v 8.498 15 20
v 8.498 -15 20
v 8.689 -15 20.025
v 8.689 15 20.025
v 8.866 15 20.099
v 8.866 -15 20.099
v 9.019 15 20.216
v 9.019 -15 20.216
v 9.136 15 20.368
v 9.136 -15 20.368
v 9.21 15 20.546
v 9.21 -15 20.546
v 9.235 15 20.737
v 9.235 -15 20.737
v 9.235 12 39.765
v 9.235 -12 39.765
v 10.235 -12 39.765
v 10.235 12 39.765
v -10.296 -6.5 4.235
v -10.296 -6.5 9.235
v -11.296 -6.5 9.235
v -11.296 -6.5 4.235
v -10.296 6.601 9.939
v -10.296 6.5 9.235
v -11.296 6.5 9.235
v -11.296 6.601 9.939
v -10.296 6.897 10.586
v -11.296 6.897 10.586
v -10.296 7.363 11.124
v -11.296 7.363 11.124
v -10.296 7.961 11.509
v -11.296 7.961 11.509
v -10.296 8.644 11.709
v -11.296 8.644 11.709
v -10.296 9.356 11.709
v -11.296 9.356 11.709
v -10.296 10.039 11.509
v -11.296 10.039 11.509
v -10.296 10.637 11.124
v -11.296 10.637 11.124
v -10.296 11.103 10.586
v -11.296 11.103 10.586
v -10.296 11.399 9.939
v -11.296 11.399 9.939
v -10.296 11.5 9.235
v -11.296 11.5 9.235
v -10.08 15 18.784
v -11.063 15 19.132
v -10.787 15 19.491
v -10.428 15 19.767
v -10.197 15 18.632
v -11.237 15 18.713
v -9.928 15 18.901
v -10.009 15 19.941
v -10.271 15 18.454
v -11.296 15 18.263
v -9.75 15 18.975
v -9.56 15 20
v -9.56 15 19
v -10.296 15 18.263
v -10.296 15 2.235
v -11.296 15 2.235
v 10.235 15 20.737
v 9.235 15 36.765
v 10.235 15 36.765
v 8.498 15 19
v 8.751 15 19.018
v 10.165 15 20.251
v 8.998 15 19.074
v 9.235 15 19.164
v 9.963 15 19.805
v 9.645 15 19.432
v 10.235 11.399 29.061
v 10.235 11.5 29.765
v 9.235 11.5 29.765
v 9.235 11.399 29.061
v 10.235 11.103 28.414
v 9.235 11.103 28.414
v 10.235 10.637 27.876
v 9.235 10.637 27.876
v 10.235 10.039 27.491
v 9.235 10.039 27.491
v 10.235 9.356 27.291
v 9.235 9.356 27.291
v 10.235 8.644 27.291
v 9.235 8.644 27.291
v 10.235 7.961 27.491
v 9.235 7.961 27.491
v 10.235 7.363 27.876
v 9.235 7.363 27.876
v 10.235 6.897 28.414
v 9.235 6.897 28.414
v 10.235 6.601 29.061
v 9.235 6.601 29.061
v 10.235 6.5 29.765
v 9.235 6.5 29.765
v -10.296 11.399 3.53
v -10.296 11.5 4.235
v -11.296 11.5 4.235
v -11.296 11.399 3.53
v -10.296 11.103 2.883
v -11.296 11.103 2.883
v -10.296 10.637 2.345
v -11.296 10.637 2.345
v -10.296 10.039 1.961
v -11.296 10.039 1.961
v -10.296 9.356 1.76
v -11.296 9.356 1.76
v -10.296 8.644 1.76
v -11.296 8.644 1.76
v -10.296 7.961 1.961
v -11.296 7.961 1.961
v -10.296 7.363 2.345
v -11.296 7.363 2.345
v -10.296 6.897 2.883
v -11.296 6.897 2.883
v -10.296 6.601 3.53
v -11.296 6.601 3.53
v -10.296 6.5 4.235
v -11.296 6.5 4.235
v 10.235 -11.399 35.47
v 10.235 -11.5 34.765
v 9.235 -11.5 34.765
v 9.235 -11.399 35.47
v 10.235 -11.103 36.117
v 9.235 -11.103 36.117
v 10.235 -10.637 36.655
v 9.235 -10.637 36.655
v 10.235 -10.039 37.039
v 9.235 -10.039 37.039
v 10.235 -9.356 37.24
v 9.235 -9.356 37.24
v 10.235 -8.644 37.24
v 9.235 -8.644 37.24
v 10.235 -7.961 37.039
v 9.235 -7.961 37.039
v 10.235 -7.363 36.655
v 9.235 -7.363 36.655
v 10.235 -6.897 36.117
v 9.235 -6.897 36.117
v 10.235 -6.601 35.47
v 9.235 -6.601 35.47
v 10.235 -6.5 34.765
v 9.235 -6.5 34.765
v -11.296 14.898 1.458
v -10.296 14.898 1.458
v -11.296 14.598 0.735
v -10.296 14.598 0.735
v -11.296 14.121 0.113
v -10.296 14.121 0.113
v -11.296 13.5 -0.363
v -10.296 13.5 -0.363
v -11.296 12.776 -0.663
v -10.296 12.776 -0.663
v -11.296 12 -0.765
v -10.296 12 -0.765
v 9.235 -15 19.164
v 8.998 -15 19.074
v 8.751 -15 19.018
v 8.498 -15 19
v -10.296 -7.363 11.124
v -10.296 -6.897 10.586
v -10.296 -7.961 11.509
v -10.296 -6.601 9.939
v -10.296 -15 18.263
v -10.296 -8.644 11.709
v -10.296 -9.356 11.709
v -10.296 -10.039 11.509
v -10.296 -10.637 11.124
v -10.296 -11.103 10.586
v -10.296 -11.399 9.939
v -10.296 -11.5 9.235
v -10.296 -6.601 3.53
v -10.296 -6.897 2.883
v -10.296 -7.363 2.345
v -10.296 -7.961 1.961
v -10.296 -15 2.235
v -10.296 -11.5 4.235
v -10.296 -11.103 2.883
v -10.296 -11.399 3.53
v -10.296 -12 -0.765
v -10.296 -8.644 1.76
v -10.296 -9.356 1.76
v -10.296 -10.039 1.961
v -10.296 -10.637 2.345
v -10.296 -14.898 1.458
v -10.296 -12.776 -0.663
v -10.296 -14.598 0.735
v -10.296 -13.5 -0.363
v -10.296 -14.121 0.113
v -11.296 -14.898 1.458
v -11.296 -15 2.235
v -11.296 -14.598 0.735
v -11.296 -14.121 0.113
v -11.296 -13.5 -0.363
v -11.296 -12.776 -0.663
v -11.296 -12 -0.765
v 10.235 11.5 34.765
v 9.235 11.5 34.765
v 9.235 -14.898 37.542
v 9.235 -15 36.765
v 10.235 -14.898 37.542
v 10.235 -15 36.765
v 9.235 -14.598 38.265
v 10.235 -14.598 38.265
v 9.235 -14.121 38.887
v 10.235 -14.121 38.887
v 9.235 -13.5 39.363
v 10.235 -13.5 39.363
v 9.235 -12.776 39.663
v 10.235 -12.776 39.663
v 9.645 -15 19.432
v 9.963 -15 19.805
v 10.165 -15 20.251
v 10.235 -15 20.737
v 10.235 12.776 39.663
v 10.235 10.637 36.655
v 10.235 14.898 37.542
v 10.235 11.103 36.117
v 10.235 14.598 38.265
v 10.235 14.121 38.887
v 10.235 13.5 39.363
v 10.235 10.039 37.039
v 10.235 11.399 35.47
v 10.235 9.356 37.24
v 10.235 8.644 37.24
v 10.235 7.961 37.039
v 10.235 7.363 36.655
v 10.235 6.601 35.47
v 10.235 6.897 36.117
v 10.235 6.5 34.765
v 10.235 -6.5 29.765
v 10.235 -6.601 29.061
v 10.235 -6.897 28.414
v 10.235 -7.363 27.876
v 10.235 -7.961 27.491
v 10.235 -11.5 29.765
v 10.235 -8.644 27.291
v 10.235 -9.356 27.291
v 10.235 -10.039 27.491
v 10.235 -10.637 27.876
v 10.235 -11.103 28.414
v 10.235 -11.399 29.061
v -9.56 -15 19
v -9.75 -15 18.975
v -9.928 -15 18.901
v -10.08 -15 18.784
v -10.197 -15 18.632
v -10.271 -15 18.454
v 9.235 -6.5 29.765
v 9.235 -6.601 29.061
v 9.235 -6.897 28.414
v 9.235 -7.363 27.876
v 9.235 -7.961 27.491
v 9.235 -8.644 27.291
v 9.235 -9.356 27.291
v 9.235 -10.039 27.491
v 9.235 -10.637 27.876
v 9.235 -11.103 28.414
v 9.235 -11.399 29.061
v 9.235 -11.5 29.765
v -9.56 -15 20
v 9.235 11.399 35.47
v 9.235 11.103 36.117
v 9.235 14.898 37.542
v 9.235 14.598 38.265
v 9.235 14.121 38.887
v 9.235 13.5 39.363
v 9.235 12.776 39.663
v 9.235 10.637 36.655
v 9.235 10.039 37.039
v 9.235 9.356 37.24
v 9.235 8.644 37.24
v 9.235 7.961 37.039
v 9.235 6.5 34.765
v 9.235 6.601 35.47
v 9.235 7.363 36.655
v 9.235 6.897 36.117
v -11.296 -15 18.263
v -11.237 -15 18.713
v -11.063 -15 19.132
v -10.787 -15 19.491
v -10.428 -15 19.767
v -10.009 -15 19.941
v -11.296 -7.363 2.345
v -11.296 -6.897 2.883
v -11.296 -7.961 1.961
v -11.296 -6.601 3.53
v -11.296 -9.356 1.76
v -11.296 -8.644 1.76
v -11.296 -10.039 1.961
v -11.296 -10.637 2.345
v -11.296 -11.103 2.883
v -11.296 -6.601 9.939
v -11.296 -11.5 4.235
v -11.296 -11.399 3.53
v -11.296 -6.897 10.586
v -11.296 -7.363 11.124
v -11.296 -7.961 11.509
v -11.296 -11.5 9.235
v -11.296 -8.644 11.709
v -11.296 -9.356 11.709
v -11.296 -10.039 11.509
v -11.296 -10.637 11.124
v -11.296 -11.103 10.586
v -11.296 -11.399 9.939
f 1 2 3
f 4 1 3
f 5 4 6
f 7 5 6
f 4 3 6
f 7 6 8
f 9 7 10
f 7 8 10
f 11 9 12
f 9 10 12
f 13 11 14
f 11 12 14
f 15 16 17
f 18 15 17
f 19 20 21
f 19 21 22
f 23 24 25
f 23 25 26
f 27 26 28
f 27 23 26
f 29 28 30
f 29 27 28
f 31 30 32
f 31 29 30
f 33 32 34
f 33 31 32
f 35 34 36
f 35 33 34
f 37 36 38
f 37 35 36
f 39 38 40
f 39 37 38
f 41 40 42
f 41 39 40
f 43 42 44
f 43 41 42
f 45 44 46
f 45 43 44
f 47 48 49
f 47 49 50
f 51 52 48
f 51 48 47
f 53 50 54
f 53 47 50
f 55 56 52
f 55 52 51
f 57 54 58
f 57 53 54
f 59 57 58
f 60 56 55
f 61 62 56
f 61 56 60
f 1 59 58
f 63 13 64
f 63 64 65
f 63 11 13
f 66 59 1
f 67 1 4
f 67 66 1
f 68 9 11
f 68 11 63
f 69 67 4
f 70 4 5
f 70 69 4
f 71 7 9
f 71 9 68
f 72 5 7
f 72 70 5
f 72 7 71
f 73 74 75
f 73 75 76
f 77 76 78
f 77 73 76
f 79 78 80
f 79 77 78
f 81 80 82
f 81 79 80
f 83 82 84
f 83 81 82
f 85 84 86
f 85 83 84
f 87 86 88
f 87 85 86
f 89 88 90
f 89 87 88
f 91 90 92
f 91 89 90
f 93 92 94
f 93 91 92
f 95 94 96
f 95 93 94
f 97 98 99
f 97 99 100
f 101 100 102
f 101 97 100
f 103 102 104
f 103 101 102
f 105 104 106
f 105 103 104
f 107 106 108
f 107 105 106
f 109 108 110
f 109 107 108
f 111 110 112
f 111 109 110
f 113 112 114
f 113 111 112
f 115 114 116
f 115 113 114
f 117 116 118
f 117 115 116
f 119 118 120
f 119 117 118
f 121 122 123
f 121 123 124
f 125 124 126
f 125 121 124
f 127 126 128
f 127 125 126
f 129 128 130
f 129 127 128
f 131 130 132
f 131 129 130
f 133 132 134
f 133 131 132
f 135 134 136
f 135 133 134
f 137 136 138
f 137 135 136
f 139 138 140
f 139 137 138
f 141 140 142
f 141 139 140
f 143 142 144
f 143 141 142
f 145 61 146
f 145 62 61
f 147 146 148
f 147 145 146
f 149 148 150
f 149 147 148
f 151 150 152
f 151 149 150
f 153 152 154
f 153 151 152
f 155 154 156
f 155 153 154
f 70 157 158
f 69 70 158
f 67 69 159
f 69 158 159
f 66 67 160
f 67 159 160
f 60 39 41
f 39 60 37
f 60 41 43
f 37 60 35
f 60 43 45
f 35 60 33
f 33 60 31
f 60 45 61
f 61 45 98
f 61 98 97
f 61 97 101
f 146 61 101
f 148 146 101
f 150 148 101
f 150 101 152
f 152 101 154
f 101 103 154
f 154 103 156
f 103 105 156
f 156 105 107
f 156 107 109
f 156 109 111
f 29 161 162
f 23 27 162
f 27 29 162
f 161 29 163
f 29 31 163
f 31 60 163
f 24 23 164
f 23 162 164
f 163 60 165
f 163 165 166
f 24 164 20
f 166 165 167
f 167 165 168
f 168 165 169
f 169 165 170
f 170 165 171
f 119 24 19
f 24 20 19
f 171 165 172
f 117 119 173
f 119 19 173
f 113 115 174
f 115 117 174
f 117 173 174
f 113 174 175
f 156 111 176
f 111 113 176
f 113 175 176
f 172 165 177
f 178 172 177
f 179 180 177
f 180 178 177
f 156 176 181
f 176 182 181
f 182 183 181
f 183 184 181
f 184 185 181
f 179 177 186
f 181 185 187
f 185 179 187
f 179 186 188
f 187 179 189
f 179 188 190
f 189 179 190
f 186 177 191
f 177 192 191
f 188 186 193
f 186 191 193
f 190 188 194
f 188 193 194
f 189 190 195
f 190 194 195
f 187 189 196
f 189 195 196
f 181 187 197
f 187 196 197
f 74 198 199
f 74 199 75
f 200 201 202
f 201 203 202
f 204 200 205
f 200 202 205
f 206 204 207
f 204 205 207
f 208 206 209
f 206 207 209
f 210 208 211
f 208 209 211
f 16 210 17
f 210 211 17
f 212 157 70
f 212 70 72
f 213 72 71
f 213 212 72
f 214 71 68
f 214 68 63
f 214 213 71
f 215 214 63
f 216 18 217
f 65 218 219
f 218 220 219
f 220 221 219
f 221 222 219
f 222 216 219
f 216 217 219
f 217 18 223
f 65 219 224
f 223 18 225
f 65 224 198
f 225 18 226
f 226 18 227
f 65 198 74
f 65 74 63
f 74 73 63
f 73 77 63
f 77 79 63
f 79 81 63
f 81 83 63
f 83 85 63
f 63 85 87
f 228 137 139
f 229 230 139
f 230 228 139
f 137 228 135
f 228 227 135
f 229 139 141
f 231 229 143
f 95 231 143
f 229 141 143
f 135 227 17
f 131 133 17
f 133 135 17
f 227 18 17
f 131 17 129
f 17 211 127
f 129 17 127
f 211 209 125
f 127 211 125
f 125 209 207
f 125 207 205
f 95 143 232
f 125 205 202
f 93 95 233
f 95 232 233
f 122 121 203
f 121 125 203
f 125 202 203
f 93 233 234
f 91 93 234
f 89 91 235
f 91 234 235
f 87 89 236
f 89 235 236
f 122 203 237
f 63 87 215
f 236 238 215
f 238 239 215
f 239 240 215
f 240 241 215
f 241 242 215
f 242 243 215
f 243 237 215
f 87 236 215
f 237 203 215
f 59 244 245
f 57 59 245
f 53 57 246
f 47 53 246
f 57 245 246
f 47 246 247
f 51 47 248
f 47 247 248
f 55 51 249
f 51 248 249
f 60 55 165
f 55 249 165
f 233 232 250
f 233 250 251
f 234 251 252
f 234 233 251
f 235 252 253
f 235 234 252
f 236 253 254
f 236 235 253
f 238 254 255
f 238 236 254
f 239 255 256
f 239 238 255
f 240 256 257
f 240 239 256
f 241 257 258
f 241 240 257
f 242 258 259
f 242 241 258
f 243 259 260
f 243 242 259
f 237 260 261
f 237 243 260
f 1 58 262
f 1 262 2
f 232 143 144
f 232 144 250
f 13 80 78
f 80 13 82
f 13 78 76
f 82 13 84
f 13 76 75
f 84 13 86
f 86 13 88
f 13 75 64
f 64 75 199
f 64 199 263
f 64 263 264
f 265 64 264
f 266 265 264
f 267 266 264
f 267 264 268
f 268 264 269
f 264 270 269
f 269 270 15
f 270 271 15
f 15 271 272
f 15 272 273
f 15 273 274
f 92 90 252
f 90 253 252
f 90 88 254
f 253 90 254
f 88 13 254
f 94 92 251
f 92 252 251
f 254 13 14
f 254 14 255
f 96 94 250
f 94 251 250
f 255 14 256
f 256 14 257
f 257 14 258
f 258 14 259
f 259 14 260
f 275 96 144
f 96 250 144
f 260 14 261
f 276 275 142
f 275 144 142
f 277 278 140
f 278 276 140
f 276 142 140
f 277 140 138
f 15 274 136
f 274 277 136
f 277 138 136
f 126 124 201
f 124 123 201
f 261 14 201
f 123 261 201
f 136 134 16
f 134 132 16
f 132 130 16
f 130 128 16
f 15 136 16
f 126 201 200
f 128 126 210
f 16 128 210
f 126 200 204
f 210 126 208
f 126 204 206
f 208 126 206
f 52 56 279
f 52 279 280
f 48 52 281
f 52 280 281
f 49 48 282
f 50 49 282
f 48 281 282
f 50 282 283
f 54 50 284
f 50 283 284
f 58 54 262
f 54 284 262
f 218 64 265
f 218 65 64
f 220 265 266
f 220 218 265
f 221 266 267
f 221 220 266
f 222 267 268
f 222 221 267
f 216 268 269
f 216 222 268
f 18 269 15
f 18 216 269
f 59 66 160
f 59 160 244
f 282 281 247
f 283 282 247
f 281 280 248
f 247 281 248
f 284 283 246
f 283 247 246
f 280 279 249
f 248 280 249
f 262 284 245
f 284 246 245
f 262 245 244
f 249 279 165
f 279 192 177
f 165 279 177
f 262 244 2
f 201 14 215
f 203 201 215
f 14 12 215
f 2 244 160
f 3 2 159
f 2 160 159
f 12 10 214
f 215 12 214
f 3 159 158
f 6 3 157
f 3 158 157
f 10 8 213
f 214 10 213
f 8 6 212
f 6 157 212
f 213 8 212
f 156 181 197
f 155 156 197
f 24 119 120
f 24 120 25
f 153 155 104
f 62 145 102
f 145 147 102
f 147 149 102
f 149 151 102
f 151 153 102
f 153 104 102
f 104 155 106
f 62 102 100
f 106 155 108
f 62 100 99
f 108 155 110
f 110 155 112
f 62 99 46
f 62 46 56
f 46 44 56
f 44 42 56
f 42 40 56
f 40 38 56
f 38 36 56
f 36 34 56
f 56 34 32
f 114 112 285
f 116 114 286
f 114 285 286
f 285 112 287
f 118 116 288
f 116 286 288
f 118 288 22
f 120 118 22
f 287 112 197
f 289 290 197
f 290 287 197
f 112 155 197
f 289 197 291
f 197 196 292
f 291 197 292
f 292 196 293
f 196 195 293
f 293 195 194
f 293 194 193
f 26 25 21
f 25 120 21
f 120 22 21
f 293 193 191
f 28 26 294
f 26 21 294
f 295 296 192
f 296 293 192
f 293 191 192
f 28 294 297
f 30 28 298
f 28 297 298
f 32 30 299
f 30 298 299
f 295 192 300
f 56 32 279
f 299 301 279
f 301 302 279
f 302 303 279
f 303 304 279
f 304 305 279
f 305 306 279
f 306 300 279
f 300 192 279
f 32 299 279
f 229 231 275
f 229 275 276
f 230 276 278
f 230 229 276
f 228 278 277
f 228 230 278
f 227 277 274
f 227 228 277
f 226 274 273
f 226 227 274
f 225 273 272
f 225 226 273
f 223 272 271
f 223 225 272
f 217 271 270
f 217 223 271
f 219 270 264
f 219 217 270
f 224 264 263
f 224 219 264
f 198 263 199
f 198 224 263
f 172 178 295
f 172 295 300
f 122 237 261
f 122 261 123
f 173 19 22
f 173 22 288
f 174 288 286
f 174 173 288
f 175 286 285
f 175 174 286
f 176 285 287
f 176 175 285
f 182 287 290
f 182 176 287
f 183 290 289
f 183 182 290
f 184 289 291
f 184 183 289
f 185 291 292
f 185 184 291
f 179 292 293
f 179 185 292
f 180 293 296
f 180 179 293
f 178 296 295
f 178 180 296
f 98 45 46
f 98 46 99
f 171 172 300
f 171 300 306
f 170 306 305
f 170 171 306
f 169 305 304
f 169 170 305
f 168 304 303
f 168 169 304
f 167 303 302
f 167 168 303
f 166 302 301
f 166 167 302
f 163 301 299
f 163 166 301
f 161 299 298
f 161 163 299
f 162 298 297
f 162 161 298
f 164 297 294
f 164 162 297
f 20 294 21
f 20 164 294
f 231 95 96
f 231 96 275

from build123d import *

# Parameters (mm, degrees)
SKETCH1_W              = 60
SKETCH1_H              = 30
BASE_FLANGE1_DEPTH     = 1
SKETCHED_START         = -15
SKETCHED_BEND1_DEPTH   = 30
SKETCHED_BEND1_2_DEPTH = 30
SKETCHED_BEND2_DEPTH   = 30
SKETCHED_BEND2_2_DEPTH = 30
CUT_EXTRUDE1_DEPTH     = 10
CUT_EXTRUDE2_DEPTH     = 10
FILLET1_R              = 3


# Read off the part's stored shape, not the designer's step: Sketched Bend1, Sketched Bend2
# Sheet-metal steps are written as plain solids
with BuildPart() as part:
    # Sketch1 → Base-Flange1 (new body)
    with BuildSketch(Plane.XY):
        Rectangle(SKETCH1_W, SKETCH1_H)
    extrude(amount=-BASE_FLANGE1_DEPTH)

    # Sketched Bend1 outline → Sketched Bend1 (cut)
    with BuildSketch(Plane(origin=(0, 0, 0), x_dir=(1, 0, 0), z_dir=(0, 1, 0)).offset(SKETCHED_START)):
        with BuildLine():
            Line((-30, 0), (9.398582279, 0))
            ThreePointArc((9.398582279, 0), (10.039397205, 0.728828115), (10.971223369, 1))
            Line((10.971223369, 1), (-30, 1))
            Line((-30, 1), (-30, 0))
        make_face()
    extrude(amount=SKETCHED_BEND1_DEPTH, mode=Mode.SUBTRACT)

    # Sketched Bend1 2 outline → Sketched Bend1 2 (add)
    with BuildSketch(Plane(origin=(0, 0, 0), x_dir=(1, 0, 0), z_dir=(0, 1, 0)).offset(SKETCHED_START)):
        with BuildLine():
            ThreePointArc((9.398582279, 0), (9.276108612, -0.359286442), (9.234623369, -0.7366))
            Line((9.234623369, -0.7366), (9.234623369, -39.765376631))
            Line((9.234623369, -39.765376631), (10.234623369, -39.765376631))
            Line((10.234623369, -39.765376631), (10.234623369, -0.7366))
            ThreePointArc((10.234623369, -0.7366), (10.450368514, -0.215745145), (10.971223369, 0))
            Line((10.971223369, 0), (9.398582279, 0))
        make_face()
    extrude(amount=SKETCHED_BEND1_2_DEPTH)

    # Sketched Bend2 outline → Sketched Bend2 (cut)
    with BuildSketch(Plane(origin=(0, 0, 0), x_dir=(1, 0, 0), z_dir=(0, 1, 0)).offset(SKETCHED_START)):
        with BuildLine():
            Line((9.234623369, -0.7366), (9.234623369, -19.16395891))
            ThreePointArc((9.234623369, -19.16395891), (9.963451484, -19.804773836), (10.234623369, -20.7366))
            Line((10.234623369, -20.7366), (10.234623369, -0.7366))
            ThreePointArc((10.234623369, -0.7366), (10.450368514, -0.215745145), (10.971223369, 0))
            Line((10.971223369, 0), (30, 0))
            Line((30, 0), (30, 1))
            Line((30, 1), (10.971223369, 1))
            ThreePointArc((10.971223369, 1), (9.743261733, 0.491361636), (9.234623369, -0.7366))
        make_face()
    extrude(amount=SKETCHED_BEND2_DEPTH, mode=Mode.SUBTRACT)

    # Sketched Bend2 2 outline → Sketched Bend2 2 (add)
    with BuildSketch(Plane(origin=(0, 0, 0), x_dir=(1, 0, 0), z_dir=(0, 1, 0)).offset(SKETCHED_START)):
        with BuildLine():
            ThreePointArc((-11.296129893, -18.2634), (-10.78749153, -19.491361636), (-9.559529893, -20))
            Line((-9.559529893, -20), (8.498023369, -20))
            ThreePointArc((8.498023369, -20), (9.018878224, -20.215745145), (9.234623369, -20.7366))
            Line((9.234623369, -20.7366), (9.234623369, -19.16395891))
            ThreePointArc((9.234623369, -19.16395891), (8.875336927, -19.041485243), (8.498023369, -19))
            Line((8.498023369, -19), (-9.559529893, -19))
            ThreePointArc((-9.559529893, -19), (-10.080384748, -18.784254855), (-10.296129893, -18.2634))
            Line((-10.296129893, -18.2634), (-10.296129893, 0.765376631))
            Line((-10.296129893, 0.765376631), (-11.296129893, 0.765376631))
            Line((-11.296129893, 0.765376631), (-11.296129893, -18.2634))
        make_face()
    extrude(amount=SKETCHED_BEND2_2_DEPTH)

    # Sketch8 → Cut-Extrude1 (cut)
    with BuildSketch(Plane(origin=(10.234623369, 0, 0), x_dir=(0, 0, -1), z_dir=(1, 0, 0))):
        with BuildLine():
            Line((-34.765376631, 11.5), (-29.765376631, 11.5))
            ThreePointArc((-29.765376631, 11.5), (-27.265376631, 9), (-29.765376631, 6.5))
            Line((-29.765376631, 6.5), (-34.765376631, 6.5))
            ThreePointArc((-34.765376631, 6.5), (-37.265376631, 9), (-34.765376631, 11.5))
        make_face()
        with BuildLine():
            Line((-34.765376631, -6.5), (-29.765376631, -6.5))
            ThreePointArc((-29.765376631, -6.5), (-27.265376631, -9), (-29.765376631, -11.5))
            Line((-29.765376631, -11.5), (-34.765376631, -11.5))
            ThreePointArc((-34.765376631, -11.5), (-37.265376631, -9), (-34.765376631, -6.5))
        make_face()
    extrude(amount=-CUT_EXTRUDE1_DEPTH, mode=Mode.SUBTRACT)

    # Sketch9 → Cut-Extrude2 (cut)
    with BuildSketch(Plane(origin=(-10.296129893, 0, 0), x_dir=(0, 0, -1), z_dir=(1, 0, 0))):
        with BuildLine():
            Line((-9.234623369, 11.5), (-4.234623369, 11.5))
            ThreePointArc((-4.234623369, 11.5), (-1.734623369, 9), (-4.234623369, 6.5))
            Line((-4.234623369, 6.5), (-9.234623369, 6.5))
            ThreePointArc((-9.234623369, 6.5), (-11.734623369, 9), (-9.234623369, 11.5))
        make_face()
        with BuildLine():
            Line((-9.234623369, -6.5), (-4.234623369, -6.5))
            ThreePointArc((-4.234623369, -6.5), (-1.734623369, -9), (-4.234623369, -11.5))
            Line((-4.234623369, -11.5), (-9.234623369, -11.5))
            ThreePointArc((-9.234623369, -11.5), (-11.734623369, -9), (-9.234623369, -6.5))
        make_face()
    extrude(amount=-CUT_EXTRUDE2_DEPTH, mode=Mode.SUBTRACT)

    # Fillet1
    fillet1_edges = [part.edges().sort_by_distance(p)[0] for p in [
        (-10.796129893, 15, -0.765376631),
        (-10.796129893, -15, -0.765376631),
        (9.734623369, -15, 39.765376631),
        (9.734623369, 15, 39.765376631),
    ]]
    fillet(fillet1_edges, radius=FILLET1_R)


solid = part.part
